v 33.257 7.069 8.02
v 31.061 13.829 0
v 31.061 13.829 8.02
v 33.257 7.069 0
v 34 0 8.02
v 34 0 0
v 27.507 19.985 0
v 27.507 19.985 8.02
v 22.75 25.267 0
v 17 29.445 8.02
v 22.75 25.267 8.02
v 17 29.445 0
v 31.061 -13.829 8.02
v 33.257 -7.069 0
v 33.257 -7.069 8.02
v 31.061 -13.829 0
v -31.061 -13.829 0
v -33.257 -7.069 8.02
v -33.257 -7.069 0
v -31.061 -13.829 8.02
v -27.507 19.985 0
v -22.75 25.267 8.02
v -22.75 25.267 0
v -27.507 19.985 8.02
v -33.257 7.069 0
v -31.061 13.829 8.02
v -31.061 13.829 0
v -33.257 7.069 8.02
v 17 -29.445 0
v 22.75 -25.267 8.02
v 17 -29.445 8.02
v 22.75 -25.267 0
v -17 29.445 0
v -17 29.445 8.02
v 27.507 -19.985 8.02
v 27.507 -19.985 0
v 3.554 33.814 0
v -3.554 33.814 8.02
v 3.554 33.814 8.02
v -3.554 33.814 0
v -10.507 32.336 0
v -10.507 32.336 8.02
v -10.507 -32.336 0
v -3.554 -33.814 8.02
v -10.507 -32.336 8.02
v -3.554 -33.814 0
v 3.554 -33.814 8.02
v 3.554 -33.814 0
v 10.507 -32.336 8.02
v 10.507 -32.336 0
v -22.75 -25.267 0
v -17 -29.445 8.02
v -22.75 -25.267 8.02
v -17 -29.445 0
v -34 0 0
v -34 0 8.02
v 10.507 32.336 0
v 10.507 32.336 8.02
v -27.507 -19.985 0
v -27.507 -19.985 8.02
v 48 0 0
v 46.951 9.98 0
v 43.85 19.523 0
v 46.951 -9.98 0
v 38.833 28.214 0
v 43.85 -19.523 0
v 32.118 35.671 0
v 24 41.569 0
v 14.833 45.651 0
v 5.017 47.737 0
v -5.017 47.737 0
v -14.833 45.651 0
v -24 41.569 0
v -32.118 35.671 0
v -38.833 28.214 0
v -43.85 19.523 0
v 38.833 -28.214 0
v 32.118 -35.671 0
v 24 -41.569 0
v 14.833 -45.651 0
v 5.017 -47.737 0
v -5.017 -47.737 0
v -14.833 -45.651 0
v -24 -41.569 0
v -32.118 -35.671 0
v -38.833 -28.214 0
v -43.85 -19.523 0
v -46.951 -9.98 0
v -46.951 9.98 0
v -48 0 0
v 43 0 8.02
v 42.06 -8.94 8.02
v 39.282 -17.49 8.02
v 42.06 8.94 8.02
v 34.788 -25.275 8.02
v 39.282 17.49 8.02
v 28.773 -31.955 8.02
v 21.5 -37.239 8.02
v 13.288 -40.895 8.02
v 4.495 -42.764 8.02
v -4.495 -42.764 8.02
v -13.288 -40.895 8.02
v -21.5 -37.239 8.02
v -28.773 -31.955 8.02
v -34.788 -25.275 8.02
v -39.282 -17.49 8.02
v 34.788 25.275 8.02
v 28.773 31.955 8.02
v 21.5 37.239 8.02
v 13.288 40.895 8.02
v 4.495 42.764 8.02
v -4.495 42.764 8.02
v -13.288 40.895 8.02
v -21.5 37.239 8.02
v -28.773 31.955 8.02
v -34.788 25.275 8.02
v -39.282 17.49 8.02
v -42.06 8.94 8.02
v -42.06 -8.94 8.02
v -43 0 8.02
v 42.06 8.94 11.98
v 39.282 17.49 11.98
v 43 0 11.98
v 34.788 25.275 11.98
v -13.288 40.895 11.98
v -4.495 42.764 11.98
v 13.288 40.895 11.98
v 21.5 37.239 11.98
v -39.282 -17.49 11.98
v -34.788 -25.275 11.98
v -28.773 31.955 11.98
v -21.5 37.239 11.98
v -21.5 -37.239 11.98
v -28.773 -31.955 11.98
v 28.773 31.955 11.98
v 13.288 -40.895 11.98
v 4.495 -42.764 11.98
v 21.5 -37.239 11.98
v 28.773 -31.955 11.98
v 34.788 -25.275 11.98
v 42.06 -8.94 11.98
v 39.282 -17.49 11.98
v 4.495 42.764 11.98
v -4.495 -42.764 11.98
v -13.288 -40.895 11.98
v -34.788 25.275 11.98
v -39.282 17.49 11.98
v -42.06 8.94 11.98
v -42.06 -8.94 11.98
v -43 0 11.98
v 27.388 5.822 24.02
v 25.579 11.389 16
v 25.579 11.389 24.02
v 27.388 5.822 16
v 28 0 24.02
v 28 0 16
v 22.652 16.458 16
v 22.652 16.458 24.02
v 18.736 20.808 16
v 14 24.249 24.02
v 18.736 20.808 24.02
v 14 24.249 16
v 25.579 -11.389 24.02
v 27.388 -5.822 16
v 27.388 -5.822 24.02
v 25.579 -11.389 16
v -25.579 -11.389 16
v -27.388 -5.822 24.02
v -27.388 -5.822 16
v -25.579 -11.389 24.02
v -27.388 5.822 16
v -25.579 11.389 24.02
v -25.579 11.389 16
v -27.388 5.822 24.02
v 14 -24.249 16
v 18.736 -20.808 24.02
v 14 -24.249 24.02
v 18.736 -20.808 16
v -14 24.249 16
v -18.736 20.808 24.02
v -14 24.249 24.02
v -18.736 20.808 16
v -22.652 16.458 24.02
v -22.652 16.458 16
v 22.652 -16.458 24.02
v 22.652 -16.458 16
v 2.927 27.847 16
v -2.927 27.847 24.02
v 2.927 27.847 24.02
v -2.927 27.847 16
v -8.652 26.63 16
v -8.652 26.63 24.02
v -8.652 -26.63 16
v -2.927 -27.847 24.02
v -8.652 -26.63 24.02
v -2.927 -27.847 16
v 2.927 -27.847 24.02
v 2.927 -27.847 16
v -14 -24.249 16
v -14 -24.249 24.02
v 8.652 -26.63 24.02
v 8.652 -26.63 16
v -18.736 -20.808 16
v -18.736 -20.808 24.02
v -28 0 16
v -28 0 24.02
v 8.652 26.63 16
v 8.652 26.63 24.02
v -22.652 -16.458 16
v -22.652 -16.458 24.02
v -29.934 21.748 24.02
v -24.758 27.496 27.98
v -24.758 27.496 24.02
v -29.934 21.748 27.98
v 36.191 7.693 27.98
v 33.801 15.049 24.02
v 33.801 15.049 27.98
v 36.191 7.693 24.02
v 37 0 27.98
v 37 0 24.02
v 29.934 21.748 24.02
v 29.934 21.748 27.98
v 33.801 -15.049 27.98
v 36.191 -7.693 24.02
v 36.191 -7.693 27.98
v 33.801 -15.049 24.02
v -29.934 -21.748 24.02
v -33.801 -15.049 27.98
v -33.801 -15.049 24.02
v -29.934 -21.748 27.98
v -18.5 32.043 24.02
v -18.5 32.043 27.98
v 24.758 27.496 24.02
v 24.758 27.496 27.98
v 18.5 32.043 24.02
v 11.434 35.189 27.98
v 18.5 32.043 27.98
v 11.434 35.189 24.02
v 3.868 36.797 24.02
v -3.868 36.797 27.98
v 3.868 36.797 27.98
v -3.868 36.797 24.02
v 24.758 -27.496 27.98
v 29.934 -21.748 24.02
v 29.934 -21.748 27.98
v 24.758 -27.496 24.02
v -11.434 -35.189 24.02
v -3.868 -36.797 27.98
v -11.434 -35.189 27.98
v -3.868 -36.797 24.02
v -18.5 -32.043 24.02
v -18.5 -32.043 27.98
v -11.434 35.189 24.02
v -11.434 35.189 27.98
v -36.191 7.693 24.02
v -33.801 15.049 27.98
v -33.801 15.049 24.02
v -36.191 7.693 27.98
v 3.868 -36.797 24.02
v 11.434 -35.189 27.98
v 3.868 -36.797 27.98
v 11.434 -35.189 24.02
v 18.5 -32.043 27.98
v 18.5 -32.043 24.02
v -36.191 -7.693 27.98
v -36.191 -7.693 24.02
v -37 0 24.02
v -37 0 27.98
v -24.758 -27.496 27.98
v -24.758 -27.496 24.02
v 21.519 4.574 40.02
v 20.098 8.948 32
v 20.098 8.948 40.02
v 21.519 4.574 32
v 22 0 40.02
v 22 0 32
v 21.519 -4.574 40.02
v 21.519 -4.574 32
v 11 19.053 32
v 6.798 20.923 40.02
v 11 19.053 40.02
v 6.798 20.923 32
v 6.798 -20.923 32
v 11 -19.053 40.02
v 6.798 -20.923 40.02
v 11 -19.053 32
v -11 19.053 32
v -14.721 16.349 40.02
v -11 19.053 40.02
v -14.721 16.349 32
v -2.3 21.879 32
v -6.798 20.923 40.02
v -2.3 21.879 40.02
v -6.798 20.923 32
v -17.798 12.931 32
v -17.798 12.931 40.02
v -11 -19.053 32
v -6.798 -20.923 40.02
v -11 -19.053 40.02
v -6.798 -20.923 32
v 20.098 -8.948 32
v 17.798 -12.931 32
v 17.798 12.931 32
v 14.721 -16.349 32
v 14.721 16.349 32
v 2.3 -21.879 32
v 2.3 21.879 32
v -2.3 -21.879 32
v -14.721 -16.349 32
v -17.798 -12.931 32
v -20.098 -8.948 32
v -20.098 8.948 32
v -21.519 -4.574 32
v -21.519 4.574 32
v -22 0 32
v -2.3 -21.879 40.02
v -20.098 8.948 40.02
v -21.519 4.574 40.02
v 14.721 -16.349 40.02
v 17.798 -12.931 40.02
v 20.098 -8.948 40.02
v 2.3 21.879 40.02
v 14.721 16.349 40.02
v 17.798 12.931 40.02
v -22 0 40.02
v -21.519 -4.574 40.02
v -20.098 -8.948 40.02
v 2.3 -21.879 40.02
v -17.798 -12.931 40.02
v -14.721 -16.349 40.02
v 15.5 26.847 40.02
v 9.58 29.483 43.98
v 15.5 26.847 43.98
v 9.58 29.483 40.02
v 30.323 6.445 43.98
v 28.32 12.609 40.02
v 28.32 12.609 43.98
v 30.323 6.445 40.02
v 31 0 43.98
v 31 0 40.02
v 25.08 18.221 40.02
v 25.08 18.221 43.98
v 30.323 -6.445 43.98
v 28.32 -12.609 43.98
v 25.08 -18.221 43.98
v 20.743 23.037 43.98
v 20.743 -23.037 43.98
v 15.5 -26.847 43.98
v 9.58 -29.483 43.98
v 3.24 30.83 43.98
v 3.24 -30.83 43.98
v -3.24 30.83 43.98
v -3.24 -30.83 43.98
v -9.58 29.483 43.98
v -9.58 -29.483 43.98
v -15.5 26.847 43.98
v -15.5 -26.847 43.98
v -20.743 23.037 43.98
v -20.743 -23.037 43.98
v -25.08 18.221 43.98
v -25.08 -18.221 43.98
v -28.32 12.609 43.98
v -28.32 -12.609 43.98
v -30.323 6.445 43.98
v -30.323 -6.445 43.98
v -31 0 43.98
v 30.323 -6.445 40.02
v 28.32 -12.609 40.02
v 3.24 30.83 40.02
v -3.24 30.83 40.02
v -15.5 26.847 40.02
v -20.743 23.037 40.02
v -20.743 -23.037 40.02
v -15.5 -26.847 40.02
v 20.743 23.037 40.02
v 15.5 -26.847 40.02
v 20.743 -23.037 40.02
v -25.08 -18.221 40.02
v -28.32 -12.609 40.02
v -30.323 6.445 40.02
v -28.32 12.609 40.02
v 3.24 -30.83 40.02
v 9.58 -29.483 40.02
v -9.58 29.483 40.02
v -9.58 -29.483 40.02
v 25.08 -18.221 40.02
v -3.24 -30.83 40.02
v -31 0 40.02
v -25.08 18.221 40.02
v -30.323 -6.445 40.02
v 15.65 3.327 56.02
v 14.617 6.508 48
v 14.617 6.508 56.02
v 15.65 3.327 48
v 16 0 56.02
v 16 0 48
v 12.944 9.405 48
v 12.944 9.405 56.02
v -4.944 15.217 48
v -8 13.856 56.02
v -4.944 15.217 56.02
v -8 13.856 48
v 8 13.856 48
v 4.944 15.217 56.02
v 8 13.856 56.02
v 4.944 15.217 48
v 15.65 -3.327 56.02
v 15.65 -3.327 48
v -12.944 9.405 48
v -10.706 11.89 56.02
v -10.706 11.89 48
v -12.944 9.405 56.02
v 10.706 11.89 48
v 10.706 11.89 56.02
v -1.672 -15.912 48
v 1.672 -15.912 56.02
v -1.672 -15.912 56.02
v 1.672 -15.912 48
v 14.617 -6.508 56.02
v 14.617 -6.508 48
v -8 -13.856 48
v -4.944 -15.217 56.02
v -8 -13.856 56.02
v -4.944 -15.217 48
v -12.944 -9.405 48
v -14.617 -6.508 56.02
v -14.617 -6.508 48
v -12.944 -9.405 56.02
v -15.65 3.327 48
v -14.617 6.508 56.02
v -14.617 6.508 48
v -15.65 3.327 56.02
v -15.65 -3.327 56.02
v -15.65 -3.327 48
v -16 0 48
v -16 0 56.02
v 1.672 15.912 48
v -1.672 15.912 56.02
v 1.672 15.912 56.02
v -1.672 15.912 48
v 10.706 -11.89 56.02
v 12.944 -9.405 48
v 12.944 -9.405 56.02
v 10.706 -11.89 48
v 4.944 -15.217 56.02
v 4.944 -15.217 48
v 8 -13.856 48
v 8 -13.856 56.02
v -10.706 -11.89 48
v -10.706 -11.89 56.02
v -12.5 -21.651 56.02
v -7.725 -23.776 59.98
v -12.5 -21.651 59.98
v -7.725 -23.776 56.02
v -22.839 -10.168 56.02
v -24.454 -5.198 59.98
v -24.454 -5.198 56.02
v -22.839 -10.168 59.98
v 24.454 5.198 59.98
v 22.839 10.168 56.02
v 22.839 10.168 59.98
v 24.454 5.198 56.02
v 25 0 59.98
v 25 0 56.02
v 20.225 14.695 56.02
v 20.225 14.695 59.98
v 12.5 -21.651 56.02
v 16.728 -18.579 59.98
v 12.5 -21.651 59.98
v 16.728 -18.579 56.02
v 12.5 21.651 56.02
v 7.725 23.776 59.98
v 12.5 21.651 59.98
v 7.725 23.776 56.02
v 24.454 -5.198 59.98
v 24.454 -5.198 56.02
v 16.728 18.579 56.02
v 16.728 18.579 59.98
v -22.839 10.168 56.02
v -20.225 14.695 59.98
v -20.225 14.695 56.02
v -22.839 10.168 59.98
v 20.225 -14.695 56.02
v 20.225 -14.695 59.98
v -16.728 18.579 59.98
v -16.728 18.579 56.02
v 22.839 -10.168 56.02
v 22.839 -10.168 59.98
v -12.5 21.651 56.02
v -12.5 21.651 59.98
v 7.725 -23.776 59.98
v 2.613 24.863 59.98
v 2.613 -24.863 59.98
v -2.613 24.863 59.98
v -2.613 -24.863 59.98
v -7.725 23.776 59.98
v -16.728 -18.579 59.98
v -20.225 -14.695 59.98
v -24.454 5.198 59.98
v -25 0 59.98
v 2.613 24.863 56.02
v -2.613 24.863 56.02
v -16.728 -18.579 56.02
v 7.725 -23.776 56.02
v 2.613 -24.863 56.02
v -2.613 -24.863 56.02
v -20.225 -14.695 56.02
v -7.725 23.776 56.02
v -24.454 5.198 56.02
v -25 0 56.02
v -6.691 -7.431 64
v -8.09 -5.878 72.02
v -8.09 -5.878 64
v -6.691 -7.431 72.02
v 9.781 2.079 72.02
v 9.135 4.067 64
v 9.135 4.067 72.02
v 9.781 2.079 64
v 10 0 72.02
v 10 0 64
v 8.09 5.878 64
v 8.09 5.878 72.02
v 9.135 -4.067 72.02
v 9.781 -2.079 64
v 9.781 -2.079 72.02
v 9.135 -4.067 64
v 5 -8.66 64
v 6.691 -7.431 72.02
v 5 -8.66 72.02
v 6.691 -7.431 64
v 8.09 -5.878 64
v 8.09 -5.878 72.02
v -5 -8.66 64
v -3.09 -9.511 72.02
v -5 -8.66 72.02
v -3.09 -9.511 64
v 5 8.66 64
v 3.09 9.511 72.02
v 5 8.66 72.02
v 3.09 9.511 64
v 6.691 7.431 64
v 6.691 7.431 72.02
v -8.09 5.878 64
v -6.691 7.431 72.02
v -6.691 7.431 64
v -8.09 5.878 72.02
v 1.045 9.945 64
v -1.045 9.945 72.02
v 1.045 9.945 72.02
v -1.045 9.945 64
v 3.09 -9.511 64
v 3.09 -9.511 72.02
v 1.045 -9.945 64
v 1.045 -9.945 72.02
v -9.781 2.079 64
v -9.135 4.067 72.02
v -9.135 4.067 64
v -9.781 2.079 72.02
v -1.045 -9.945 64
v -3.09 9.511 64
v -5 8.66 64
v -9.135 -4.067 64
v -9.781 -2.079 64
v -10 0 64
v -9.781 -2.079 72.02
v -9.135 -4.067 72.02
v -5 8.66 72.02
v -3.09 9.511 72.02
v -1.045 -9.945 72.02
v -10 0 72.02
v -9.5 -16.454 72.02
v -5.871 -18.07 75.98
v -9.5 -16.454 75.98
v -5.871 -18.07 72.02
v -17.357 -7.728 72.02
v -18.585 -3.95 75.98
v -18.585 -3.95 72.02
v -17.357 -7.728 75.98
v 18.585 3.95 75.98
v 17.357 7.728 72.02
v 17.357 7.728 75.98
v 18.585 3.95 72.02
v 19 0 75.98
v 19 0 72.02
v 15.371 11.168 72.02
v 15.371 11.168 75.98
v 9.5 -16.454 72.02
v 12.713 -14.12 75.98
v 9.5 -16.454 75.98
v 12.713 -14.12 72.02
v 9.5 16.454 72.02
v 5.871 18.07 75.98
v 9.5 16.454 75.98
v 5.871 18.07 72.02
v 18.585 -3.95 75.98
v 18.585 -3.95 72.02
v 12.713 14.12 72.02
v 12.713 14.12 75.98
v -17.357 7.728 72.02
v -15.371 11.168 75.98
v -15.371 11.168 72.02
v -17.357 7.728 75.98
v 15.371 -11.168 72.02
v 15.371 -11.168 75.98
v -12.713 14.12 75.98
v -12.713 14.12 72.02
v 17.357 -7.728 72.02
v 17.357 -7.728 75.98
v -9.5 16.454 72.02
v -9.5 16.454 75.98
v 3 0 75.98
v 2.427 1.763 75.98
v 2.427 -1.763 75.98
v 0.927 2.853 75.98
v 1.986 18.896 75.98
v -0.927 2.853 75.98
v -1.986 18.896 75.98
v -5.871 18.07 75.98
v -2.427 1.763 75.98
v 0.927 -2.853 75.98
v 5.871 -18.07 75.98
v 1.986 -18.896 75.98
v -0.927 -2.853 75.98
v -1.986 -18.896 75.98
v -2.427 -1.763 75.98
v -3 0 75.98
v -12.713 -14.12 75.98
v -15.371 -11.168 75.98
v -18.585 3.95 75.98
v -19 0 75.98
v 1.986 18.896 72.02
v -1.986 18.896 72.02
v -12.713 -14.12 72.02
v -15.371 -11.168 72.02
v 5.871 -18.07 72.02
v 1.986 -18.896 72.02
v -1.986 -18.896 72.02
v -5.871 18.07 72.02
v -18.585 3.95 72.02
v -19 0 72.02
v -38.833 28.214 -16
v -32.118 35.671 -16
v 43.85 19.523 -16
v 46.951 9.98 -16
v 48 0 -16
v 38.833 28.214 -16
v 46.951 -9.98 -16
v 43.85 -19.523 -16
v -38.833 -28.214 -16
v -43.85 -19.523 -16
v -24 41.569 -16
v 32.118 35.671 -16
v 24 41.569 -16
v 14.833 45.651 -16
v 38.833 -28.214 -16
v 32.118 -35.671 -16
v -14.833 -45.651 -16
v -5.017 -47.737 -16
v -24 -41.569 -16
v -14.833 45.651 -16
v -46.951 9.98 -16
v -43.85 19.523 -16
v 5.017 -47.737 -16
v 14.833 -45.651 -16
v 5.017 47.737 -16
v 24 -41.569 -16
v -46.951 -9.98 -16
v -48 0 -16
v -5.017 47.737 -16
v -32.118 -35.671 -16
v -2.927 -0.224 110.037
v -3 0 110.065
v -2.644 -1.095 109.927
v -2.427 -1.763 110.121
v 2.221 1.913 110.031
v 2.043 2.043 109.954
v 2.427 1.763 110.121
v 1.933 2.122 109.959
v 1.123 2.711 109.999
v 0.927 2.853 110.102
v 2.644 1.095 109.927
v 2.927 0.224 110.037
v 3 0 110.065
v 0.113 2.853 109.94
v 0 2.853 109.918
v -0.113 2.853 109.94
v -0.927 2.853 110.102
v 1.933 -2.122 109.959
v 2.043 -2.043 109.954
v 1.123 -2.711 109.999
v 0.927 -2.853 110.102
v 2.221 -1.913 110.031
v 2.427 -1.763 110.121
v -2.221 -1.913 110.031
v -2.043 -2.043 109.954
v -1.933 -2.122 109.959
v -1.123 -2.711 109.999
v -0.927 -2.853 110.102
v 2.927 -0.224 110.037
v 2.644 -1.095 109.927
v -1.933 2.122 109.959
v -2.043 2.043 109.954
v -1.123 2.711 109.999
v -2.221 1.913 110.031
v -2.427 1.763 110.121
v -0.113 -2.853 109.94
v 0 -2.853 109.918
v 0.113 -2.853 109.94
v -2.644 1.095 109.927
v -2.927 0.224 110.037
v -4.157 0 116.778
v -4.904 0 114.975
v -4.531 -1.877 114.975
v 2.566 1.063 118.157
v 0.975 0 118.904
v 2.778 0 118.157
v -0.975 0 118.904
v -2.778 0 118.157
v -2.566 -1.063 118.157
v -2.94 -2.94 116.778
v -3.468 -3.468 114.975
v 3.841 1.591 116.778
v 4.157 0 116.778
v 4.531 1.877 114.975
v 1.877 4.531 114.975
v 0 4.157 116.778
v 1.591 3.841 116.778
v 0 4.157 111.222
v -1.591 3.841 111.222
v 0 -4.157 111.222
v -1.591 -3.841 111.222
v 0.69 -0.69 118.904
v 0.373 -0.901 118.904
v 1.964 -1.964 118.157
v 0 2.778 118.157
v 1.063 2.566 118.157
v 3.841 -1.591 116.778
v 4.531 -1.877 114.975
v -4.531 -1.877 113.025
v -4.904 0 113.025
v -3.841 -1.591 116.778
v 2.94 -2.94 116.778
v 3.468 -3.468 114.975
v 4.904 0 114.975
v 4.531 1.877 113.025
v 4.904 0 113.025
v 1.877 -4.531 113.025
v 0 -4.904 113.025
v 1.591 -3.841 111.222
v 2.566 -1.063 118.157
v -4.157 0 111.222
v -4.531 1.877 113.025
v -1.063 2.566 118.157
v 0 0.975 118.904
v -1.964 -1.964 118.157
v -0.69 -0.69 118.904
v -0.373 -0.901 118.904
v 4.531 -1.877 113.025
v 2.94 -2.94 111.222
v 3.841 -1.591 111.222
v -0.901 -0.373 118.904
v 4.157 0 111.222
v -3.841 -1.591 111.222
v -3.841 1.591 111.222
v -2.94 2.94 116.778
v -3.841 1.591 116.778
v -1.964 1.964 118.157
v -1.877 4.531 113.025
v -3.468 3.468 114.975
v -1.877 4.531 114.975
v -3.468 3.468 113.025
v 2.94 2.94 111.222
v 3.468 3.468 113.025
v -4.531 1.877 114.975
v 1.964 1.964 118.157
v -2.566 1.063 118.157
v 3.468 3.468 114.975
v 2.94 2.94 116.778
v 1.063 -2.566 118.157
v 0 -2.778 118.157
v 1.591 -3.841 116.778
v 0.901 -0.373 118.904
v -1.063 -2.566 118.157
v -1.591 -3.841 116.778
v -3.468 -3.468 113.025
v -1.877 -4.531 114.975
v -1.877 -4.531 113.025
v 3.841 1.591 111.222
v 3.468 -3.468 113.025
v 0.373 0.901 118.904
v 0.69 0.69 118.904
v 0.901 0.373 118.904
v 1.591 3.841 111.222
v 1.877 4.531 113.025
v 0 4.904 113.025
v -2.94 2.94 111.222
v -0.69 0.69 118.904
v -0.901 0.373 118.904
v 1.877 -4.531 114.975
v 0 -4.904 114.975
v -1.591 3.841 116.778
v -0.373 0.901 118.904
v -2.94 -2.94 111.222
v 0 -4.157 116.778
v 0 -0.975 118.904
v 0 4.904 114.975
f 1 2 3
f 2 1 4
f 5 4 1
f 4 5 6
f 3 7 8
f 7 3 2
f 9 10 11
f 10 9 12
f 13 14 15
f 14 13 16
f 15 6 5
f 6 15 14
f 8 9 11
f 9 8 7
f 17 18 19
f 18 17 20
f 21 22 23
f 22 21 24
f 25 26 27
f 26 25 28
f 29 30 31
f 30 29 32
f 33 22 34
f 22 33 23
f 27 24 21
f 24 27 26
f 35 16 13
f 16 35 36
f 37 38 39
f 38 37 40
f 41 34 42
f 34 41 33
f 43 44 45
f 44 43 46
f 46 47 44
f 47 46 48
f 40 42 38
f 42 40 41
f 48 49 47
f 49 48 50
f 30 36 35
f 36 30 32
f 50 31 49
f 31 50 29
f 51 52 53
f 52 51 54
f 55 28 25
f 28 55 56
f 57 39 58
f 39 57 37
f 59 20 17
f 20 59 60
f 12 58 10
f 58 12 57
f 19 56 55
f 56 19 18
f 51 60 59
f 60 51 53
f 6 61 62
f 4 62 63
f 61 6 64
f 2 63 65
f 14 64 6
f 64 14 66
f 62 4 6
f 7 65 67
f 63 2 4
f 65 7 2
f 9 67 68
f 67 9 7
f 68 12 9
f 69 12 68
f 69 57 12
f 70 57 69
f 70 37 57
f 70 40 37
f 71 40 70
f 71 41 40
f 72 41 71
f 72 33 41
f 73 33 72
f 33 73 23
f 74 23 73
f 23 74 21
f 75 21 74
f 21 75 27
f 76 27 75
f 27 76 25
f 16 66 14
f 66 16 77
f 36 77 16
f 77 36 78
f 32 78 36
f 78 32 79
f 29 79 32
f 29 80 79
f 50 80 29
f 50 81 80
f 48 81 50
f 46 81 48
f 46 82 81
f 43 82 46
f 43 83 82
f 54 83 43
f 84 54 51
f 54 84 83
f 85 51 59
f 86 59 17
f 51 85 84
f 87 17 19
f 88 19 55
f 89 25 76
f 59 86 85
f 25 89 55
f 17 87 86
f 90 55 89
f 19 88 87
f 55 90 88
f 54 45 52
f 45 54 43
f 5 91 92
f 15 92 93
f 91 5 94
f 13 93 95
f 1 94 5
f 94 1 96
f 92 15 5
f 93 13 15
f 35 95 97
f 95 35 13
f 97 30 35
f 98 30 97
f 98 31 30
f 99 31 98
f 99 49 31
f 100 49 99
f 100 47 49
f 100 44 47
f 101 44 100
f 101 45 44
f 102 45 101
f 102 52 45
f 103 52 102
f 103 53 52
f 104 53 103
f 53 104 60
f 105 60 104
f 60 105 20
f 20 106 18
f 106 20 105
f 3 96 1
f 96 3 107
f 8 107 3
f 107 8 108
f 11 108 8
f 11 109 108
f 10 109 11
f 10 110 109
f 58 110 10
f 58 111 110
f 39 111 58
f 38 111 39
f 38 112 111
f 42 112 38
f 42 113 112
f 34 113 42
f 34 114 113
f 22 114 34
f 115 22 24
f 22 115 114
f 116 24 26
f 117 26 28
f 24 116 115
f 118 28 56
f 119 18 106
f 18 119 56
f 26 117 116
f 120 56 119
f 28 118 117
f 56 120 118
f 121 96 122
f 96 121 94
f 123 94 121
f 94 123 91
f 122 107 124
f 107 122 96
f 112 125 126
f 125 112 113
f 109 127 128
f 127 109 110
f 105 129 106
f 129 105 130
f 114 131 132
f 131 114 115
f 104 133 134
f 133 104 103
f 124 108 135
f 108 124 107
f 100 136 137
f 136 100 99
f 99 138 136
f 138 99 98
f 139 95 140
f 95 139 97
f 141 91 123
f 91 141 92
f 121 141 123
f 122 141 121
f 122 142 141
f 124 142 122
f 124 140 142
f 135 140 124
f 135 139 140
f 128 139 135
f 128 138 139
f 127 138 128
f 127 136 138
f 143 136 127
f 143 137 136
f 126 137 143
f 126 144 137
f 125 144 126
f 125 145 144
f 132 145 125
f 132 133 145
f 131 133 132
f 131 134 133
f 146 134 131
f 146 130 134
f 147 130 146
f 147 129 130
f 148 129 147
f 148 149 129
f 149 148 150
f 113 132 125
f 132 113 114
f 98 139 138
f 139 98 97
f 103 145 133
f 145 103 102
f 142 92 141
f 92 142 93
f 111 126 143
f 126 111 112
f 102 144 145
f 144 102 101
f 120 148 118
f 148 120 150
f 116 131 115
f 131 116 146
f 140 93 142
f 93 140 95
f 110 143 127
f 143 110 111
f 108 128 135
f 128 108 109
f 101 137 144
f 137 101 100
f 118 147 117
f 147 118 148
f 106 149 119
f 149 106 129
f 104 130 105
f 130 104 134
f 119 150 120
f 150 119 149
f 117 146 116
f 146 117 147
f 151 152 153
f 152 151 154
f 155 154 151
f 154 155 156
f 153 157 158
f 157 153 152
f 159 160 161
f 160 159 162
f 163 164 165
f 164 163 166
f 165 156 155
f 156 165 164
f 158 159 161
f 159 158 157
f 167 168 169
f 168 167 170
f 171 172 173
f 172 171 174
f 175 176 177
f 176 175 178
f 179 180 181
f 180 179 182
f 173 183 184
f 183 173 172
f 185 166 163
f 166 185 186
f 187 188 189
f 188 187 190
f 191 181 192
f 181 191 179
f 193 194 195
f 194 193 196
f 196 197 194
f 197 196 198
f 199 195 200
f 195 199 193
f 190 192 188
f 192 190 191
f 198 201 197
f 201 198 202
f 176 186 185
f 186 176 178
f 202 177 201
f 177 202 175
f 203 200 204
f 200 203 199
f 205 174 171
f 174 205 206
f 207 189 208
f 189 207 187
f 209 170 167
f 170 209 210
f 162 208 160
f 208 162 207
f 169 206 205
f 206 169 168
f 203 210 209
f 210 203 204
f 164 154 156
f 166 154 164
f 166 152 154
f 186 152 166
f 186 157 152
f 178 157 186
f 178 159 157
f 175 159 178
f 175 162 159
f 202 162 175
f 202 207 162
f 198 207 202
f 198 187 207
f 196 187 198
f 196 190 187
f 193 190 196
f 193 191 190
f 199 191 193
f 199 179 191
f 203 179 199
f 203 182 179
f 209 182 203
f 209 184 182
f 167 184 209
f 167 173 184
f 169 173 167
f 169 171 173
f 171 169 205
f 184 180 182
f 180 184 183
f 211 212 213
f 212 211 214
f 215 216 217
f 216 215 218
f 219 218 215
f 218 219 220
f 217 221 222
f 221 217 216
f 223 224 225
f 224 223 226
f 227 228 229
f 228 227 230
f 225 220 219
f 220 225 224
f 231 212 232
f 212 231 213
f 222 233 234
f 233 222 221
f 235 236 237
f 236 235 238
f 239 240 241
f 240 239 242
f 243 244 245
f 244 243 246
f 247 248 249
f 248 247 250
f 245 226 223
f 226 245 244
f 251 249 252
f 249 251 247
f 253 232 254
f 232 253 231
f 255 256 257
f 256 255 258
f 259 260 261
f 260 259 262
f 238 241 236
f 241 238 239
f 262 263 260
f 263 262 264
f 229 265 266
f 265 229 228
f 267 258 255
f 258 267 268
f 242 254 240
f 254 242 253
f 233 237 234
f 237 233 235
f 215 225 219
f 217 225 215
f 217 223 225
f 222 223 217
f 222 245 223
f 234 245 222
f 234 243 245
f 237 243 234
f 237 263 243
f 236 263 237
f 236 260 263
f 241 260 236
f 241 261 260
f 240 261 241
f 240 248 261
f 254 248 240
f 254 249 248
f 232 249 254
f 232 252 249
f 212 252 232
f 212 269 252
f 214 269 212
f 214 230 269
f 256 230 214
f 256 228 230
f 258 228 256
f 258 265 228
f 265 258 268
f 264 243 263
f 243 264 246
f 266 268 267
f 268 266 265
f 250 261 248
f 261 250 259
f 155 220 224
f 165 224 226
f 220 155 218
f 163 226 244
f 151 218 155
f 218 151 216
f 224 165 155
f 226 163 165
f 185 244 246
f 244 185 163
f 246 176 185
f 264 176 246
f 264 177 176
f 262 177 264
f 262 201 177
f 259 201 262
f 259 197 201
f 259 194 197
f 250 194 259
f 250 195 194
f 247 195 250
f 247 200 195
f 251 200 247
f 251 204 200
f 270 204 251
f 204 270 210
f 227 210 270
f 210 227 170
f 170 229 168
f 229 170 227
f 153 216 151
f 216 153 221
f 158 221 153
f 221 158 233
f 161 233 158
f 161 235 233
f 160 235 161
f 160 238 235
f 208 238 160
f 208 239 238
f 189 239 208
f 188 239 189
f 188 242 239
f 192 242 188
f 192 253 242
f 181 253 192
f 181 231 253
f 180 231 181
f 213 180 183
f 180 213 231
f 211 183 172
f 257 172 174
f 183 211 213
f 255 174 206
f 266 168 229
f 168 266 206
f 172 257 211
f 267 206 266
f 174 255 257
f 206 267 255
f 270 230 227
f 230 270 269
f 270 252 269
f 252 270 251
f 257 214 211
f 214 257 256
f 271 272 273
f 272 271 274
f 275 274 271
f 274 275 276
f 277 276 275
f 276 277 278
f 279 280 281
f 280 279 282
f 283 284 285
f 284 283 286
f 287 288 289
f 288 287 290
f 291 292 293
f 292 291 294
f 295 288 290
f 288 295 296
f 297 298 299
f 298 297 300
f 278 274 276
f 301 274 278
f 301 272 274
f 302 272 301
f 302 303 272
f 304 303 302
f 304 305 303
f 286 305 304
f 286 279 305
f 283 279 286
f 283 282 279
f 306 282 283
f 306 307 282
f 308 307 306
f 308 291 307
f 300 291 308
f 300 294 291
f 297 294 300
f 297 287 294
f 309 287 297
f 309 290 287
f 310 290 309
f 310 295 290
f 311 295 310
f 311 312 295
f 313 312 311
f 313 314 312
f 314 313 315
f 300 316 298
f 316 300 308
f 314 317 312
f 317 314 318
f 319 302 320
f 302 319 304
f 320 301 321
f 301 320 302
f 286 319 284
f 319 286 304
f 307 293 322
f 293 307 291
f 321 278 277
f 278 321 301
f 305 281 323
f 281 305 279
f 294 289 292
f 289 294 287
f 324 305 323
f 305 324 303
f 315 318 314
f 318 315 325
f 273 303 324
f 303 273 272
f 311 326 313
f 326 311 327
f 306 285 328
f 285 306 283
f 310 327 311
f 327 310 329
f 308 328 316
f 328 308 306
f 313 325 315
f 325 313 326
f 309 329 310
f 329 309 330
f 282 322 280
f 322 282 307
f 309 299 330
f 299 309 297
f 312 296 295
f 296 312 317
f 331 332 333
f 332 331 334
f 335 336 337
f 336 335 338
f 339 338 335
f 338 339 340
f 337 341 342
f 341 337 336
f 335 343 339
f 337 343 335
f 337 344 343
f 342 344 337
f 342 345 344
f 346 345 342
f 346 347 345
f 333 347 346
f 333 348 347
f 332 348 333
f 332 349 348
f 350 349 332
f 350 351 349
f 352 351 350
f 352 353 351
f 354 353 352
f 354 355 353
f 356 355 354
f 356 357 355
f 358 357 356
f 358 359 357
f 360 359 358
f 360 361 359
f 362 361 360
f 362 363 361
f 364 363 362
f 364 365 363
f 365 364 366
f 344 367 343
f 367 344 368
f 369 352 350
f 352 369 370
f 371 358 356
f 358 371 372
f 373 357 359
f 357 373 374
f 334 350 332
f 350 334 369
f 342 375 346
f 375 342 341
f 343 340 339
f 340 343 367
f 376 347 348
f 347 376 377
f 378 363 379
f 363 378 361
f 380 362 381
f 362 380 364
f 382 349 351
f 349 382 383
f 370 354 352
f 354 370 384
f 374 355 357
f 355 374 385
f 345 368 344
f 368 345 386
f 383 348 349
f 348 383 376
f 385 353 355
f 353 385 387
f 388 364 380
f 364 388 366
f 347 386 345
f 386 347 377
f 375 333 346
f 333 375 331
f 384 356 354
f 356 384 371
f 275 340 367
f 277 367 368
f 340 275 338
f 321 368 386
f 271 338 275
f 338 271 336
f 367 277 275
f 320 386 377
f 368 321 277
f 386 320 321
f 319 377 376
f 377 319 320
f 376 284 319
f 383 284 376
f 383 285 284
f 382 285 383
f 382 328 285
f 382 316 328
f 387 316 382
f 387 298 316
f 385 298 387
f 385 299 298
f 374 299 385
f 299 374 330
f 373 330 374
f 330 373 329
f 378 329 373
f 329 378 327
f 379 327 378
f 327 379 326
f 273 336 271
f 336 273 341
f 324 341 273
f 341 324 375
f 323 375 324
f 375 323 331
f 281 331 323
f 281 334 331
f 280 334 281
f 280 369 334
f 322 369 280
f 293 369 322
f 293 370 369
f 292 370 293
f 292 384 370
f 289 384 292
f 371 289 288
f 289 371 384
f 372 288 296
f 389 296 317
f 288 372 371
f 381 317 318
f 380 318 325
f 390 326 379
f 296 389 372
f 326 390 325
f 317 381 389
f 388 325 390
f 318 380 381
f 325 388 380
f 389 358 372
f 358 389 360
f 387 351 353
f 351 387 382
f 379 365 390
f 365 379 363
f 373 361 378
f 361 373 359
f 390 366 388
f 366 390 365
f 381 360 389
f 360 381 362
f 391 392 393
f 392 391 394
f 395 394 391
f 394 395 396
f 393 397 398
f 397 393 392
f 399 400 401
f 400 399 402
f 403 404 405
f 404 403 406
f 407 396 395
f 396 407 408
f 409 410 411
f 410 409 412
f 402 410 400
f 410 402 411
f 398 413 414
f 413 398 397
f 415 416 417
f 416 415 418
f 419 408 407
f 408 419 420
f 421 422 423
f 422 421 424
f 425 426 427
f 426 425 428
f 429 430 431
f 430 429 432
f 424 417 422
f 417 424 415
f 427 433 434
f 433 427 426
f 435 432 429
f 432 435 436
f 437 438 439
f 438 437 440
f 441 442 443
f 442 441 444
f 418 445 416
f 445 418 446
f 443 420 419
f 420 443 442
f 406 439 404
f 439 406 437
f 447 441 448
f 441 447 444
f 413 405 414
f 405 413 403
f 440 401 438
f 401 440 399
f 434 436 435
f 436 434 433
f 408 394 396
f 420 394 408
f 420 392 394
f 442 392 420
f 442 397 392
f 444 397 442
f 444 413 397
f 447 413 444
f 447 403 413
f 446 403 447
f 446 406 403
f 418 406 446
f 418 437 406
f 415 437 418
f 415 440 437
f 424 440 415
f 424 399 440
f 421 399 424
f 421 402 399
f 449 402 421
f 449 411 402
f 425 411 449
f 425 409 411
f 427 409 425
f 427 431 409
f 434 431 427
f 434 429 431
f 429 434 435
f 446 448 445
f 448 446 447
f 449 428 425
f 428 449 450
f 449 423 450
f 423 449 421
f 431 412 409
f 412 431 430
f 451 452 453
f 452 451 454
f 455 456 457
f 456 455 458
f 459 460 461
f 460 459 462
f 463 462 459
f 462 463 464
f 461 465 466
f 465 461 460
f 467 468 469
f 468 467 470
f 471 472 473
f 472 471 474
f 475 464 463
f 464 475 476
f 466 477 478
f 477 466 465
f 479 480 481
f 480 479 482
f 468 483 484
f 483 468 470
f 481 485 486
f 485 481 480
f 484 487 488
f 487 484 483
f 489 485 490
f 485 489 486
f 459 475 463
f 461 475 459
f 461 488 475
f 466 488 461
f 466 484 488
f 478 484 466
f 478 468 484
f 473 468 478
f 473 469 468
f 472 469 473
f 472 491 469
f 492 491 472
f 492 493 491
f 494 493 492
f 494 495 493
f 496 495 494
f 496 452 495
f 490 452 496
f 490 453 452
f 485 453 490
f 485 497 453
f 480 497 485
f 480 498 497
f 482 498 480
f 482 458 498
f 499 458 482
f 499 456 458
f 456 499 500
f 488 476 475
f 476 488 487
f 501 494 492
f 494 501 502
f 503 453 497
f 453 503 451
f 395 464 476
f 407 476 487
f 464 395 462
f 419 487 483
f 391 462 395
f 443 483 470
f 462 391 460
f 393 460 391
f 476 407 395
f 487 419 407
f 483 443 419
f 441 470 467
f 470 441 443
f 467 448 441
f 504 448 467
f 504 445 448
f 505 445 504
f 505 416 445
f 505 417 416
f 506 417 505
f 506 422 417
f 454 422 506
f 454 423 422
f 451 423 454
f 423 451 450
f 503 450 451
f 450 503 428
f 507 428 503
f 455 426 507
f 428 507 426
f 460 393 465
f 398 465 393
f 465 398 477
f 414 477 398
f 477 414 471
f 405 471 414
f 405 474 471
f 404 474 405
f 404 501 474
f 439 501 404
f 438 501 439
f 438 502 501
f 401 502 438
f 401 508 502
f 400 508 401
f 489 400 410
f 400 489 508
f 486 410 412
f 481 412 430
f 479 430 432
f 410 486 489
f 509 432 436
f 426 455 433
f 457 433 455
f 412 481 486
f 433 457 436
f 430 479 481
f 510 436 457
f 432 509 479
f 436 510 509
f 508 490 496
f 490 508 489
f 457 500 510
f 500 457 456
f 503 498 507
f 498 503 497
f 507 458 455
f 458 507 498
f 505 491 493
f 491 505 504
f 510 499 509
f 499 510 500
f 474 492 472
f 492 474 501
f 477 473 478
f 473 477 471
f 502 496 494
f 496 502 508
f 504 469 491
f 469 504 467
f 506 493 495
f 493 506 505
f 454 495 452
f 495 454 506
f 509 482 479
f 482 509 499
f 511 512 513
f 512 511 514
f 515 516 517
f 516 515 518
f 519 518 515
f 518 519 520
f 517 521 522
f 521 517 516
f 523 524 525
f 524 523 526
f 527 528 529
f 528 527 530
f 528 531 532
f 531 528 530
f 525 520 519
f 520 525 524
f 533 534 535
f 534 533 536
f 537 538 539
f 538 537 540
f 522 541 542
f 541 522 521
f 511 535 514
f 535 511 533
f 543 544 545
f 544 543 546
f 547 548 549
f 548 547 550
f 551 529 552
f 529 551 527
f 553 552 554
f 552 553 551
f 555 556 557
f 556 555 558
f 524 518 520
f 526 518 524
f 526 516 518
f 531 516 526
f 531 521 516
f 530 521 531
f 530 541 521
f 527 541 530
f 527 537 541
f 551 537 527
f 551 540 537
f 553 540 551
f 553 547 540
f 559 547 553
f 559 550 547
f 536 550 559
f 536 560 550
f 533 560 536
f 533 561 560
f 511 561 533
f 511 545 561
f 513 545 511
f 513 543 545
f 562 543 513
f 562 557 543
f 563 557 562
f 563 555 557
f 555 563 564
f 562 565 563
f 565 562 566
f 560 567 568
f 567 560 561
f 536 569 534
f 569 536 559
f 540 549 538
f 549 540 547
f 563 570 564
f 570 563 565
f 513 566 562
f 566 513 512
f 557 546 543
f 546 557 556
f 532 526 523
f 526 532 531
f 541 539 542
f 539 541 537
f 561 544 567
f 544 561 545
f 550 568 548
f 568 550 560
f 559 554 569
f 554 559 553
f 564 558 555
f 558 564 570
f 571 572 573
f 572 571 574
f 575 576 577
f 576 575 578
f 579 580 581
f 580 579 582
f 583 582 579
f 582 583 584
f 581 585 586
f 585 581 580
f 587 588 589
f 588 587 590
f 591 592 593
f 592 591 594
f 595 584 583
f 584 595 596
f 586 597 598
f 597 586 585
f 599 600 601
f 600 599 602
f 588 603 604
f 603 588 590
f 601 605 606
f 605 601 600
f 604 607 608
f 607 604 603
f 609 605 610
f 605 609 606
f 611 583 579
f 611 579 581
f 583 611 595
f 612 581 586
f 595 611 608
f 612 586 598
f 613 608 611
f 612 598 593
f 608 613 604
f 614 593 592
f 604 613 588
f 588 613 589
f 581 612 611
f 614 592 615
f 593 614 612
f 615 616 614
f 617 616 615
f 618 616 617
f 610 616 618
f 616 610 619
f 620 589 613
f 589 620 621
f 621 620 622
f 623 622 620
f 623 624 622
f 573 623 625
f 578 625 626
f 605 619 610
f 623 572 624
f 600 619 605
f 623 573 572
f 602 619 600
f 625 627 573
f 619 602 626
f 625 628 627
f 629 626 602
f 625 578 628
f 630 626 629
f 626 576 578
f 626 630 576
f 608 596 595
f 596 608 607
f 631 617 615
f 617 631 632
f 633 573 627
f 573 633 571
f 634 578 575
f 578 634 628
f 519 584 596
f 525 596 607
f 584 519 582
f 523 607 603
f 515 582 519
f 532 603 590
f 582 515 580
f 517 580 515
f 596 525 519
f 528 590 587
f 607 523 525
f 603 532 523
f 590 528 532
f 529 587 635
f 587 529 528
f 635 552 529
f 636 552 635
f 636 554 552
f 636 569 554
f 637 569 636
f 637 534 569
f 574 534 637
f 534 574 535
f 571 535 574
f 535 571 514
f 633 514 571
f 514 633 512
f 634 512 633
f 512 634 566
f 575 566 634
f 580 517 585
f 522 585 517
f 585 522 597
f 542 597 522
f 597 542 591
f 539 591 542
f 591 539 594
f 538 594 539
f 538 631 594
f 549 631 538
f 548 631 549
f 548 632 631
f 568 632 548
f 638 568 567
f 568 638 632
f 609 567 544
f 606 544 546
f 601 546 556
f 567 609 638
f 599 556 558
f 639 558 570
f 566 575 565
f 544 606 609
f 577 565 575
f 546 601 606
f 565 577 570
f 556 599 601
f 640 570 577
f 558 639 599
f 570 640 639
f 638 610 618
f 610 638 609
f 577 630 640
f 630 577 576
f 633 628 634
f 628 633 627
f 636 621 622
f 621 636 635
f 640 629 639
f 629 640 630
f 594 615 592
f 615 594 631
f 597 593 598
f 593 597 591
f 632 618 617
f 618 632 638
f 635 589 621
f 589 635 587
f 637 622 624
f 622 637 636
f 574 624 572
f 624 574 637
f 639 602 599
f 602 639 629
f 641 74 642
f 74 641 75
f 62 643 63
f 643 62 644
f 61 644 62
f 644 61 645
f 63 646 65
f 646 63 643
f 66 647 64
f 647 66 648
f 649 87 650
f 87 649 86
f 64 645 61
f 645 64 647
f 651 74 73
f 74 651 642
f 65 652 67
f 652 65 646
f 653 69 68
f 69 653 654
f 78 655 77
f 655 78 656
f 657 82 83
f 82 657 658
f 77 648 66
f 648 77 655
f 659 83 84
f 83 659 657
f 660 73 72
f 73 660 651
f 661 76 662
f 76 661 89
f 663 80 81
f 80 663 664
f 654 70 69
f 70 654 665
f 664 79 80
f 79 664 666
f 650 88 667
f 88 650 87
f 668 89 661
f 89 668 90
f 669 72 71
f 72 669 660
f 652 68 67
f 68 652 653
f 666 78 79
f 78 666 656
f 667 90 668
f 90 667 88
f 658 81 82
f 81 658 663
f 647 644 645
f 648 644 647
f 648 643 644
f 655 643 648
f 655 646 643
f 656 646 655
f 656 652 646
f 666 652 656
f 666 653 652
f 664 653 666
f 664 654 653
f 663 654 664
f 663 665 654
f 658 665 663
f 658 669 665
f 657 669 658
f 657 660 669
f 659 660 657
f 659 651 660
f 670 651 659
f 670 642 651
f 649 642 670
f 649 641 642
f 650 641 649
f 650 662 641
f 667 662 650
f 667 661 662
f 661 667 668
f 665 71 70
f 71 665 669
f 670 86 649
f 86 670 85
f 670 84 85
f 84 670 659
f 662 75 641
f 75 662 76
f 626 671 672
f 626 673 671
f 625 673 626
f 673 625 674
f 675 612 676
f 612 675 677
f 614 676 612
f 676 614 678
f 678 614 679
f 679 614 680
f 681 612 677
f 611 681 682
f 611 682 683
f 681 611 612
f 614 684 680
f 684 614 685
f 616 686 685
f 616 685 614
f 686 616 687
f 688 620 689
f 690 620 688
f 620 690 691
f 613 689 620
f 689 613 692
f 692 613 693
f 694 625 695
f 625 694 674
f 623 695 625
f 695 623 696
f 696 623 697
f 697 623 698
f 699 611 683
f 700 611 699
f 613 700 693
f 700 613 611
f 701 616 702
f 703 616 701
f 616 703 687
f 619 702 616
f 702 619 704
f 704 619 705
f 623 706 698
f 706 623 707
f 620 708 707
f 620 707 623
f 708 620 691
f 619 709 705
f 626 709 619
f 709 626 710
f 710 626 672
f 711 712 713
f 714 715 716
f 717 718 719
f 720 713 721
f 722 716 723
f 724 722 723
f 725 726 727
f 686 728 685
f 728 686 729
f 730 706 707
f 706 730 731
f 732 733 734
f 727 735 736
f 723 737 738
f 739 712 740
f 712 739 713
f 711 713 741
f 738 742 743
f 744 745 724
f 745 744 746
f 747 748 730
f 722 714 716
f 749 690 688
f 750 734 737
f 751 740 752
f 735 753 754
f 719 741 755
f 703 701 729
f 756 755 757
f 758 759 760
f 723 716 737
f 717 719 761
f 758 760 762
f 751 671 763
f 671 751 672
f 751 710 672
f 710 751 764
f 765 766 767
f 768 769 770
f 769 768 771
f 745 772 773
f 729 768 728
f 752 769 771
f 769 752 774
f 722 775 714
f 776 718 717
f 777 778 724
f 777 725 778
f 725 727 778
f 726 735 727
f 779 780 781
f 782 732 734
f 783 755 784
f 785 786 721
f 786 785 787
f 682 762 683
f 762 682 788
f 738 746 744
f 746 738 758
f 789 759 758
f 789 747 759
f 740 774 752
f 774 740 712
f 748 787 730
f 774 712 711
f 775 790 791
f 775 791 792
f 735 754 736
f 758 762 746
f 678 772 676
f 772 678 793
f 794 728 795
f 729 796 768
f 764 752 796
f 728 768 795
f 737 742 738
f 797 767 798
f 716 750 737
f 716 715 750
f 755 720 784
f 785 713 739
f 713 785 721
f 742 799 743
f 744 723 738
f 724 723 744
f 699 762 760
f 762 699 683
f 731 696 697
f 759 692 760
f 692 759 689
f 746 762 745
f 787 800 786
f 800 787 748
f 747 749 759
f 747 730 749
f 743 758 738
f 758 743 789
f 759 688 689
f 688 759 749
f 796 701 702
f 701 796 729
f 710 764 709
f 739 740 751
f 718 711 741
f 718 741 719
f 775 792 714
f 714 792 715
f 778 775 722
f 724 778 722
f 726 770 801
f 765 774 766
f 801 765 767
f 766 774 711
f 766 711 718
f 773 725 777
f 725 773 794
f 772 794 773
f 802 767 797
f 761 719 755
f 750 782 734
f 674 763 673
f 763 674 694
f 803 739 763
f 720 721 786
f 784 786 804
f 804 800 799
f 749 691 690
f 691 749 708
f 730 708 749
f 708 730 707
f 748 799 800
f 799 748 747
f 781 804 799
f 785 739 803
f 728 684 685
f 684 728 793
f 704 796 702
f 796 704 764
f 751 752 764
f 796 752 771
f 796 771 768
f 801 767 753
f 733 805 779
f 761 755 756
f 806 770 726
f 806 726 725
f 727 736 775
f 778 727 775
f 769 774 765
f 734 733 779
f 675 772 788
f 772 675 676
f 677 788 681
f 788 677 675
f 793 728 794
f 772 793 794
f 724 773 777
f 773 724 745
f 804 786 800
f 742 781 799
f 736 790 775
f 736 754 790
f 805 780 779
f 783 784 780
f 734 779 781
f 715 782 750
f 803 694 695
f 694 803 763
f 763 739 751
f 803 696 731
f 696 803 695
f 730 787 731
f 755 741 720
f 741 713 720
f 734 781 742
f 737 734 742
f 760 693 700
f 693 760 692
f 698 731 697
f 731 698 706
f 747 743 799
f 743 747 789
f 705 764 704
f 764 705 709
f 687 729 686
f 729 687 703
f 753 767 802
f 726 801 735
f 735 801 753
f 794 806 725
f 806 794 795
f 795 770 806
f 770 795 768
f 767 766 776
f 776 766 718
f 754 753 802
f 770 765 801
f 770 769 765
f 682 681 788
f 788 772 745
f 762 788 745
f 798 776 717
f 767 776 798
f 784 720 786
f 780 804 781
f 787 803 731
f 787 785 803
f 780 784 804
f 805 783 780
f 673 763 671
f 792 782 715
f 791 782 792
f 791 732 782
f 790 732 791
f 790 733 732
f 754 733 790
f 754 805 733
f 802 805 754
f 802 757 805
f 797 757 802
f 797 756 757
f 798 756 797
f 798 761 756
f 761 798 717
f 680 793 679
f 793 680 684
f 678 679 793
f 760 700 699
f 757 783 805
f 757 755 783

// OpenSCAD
// 3DScad sample: Japanese pagoda
// Uses only the currently round-trippable subset.

module scene_model() {
    tiers = 5;
    base_r = 34;
    tier_h = 16;
    wall_h = 10;
    shrink = 6;
    overhang = 9;

    union() {
        translate([0, 0, -8]) {
            cylinder(h=16, r=base_r + 14, center=true);
        }
        for (i = [0 : 1 : tiers - 1]) {
            translate([0, 0, i * tier_h + wall_h / 2]) {
                cylinder(h=wall_h, r=base_r - i * shrink, center=true);
            }
            translate([0, 0, i * tier_h + wall_h]) {
                scale([1, 1, 0.22]) {
                    cylinder(h=overhang * 2, r=base_r - i * shrink + overhang, center=true);
                }
            }
        }
        translate([0, 0, tiers * tier_h + wall_h + 4]) {
            cylinder(h=tiers * tier_h / 2, r=3, center=true);
        }
        translate([0, 0, tiers * tier_h + wall_h + 4 + tiers * tier_h / 2 / 2]) {
            sphere(r=5);
        }
    }
}

scene_model();
